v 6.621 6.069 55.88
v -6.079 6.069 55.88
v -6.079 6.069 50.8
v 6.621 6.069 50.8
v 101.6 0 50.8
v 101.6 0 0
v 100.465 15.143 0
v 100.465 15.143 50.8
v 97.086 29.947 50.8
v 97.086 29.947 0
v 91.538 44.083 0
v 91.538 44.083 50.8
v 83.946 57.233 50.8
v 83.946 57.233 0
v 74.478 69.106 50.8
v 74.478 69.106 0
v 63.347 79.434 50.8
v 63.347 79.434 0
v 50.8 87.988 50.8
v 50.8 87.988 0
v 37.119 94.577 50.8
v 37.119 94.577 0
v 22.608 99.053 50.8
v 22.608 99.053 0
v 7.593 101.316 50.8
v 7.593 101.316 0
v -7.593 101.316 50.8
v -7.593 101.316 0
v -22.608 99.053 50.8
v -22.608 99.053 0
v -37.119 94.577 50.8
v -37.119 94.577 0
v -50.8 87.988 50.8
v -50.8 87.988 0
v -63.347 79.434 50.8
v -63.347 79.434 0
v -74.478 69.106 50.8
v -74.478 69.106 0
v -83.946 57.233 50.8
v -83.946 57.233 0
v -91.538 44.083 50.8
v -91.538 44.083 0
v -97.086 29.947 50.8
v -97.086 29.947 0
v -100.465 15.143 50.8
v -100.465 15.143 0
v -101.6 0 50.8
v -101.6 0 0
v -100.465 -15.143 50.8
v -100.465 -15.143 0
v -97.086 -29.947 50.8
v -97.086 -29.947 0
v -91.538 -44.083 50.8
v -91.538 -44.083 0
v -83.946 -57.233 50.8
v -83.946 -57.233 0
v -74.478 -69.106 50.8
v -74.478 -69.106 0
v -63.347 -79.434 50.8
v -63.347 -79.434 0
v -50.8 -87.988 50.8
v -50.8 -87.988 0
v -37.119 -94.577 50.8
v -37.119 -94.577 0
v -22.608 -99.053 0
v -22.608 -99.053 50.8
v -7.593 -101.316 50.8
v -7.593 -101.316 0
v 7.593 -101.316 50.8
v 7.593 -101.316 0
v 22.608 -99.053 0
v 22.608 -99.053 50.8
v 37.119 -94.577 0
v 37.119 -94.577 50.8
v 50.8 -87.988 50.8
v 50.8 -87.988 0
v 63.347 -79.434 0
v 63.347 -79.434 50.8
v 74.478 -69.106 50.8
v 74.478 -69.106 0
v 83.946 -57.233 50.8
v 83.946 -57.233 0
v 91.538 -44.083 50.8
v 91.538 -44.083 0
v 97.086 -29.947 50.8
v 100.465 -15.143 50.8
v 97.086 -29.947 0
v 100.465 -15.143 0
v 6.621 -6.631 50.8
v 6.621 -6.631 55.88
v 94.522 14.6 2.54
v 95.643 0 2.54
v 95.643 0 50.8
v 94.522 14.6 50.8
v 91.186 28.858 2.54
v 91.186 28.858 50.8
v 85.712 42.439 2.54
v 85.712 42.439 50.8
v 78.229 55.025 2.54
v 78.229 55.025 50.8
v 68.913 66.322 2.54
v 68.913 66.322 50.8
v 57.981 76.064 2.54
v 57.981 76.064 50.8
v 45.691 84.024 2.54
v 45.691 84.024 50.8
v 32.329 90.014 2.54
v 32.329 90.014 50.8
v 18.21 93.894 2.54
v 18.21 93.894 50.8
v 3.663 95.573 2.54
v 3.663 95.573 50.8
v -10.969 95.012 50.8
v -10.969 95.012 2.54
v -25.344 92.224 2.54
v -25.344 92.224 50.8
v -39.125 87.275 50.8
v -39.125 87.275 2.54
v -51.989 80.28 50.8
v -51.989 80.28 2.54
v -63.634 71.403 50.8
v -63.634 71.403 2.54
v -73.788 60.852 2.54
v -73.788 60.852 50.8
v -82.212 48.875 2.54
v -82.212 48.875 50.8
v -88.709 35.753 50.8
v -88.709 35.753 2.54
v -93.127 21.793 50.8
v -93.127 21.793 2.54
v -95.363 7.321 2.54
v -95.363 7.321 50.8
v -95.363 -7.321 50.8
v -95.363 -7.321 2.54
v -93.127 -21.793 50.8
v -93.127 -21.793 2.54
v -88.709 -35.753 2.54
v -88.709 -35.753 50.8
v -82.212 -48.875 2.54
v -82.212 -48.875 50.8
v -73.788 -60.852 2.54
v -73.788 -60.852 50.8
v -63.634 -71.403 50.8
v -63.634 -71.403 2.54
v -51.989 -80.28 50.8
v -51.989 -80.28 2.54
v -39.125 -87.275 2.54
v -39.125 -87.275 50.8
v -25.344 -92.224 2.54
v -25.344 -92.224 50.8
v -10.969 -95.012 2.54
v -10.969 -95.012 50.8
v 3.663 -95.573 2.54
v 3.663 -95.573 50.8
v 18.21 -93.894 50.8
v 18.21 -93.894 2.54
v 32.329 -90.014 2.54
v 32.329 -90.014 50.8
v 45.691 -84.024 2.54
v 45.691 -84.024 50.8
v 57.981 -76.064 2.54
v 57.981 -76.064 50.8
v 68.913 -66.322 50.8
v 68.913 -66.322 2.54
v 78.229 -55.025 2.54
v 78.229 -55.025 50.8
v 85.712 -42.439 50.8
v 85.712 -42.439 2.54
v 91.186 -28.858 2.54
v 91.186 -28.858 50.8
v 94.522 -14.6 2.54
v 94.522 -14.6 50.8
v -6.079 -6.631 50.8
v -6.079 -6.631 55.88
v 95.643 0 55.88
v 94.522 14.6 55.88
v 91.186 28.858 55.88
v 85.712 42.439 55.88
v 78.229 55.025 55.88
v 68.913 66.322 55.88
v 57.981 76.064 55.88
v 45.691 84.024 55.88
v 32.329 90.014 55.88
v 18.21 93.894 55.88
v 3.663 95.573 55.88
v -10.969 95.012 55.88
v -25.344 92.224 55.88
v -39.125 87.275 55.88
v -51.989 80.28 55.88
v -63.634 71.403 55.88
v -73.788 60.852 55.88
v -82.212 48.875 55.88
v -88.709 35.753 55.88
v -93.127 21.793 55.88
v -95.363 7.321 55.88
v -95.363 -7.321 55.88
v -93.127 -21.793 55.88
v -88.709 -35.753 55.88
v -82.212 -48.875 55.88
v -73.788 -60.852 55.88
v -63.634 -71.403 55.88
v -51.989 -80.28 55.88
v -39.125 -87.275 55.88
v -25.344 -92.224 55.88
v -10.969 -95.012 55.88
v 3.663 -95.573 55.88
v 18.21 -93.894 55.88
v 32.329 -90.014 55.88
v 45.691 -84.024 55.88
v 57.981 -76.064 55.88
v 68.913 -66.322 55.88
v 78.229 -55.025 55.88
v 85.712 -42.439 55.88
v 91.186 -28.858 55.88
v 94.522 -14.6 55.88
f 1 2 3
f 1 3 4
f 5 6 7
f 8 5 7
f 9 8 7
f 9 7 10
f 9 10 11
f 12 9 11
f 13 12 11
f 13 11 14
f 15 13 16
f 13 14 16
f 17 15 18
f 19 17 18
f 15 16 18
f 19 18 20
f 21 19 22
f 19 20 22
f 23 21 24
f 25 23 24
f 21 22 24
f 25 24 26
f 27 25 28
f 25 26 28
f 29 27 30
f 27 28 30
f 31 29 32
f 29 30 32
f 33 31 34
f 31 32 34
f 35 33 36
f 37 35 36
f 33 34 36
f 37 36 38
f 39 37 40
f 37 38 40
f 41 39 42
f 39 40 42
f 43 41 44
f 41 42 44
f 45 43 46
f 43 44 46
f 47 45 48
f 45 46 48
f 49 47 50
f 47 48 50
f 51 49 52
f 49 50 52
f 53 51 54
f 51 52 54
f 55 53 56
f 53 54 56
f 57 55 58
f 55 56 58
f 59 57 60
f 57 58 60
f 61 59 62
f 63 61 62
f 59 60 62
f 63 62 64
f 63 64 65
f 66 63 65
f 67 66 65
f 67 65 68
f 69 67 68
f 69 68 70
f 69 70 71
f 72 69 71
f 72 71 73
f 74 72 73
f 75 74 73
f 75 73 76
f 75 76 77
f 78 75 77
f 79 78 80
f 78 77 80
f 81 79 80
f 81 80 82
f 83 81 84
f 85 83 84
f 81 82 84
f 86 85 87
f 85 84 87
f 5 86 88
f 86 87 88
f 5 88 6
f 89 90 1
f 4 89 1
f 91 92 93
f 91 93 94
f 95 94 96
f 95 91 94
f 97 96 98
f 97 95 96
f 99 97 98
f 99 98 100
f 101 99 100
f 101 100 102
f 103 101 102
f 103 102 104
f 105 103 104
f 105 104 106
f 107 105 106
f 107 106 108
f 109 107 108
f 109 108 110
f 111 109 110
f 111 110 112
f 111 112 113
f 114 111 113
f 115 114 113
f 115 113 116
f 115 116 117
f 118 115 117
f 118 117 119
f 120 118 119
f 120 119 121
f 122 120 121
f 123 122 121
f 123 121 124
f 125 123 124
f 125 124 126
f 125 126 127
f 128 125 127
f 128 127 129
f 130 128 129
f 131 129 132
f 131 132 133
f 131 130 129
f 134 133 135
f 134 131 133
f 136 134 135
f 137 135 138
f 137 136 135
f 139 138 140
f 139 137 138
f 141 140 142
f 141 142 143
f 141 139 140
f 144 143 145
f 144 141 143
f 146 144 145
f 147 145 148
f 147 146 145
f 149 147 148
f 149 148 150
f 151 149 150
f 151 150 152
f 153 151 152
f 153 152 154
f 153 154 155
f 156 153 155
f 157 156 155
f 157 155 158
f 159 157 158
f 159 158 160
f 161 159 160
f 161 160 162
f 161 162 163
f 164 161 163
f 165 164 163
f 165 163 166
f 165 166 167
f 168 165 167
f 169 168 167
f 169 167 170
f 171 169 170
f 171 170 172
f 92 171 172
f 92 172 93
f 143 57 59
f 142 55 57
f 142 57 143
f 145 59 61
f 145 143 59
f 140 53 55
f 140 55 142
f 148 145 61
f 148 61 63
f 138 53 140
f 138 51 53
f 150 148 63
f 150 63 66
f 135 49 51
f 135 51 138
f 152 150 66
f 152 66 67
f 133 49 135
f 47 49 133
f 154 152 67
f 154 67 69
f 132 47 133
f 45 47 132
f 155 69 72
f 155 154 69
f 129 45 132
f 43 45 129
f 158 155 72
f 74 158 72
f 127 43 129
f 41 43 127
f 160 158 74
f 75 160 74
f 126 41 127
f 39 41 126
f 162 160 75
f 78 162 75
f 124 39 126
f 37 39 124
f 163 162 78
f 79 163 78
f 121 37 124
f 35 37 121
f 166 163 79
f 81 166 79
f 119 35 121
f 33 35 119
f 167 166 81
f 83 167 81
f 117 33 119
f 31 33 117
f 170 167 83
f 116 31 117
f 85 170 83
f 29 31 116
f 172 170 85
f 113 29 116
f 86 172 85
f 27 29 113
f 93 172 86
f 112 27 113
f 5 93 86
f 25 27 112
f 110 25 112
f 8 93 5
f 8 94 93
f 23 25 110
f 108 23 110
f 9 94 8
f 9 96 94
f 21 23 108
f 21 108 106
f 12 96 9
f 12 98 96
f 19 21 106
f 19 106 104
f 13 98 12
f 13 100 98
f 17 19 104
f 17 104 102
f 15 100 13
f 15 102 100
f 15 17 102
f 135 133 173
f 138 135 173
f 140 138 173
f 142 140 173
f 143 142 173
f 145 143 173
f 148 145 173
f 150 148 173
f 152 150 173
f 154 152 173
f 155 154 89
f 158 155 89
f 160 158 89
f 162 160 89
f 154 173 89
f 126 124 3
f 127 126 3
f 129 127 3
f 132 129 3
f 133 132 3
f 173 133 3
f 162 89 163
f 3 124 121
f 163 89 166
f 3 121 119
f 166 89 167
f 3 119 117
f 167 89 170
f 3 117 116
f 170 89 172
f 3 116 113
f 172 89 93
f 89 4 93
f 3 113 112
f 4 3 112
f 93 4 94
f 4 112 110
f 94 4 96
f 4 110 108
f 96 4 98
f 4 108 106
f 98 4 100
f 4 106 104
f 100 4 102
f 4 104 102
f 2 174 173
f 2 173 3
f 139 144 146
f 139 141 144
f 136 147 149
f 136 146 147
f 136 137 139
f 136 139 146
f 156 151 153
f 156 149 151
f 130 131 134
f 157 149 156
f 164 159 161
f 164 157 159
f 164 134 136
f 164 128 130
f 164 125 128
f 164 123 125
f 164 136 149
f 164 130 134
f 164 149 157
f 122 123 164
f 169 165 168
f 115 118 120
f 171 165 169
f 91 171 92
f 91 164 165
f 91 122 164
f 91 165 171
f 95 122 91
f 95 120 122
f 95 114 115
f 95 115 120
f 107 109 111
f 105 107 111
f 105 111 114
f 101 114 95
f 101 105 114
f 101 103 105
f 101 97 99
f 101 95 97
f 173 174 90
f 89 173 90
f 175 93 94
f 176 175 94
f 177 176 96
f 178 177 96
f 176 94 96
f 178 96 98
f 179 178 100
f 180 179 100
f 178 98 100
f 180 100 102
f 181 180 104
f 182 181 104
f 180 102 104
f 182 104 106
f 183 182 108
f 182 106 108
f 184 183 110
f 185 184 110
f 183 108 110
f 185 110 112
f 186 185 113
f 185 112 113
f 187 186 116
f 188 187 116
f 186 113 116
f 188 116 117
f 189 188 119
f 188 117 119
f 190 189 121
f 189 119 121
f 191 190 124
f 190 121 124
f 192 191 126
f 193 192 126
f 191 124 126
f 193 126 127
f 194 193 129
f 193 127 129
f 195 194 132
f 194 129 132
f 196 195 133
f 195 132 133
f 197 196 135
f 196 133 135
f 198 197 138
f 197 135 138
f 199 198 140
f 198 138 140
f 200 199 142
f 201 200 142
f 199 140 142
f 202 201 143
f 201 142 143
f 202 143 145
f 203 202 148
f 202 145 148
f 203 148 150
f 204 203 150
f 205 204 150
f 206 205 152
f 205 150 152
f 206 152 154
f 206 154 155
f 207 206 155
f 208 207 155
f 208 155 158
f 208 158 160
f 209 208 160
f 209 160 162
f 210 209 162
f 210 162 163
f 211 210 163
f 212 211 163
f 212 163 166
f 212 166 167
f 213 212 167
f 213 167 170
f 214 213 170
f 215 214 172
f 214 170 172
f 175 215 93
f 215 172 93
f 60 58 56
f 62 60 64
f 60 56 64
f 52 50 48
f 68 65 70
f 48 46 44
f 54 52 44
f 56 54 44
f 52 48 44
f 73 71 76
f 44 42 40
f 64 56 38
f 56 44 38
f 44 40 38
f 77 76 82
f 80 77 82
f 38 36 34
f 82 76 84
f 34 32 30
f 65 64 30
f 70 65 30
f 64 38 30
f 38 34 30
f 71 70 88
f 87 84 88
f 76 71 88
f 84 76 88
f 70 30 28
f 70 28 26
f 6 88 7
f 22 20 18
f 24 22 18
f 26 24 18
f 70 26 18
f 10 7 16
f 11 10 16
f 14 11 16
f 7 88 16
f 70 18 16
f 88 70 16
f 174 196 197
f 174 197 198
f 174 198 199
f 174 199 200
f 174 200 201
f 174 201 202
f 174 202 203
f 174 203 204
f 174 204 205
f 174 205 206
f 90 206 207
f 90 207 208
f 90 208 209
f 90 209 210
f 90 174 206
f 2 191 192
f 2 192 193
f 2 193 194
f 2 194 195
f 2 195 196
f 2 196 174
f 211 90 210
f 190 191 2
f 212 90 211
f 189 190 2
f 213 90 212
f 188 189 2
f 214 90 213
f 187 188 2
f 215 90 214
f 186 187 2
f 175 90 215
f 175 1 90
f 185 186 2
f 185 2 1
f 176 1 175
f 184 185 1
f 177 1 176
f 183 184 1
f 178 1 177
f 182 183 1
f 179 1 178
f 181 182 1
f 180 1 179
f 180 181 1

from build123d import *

# Parameters (mm, degrees)
F1_R     = 101.6
F1_R_2   = 95.643189
F2_DEPTH = 50.8
F3_R     = 95.67193
F4_DEPTH = 2.54
F5_R     = 95.643189
F6_DEPTH = 5.08
F7_W     = 12.7
F7_H     = 12.7
F8_DEPTH = 50.8


with BuildPart() as f2:
    # F1 (on face) → F2 (new body)
    with BuildSketch(Plane.XY):
        Circle(F1_R)
        Circle(F1_R_2, mode=Mode.SUBTRACT)
    extrude(amount=F2_DEPTH)

    # F3 (on face) → F4 (join)
    with BuildSketch(Plane.XY):
        Circle(F3_R)
    extrude(amount=F4_DEPTH)


with BuildPart() as f6:
    # F5 (on face) → F6 (new body)
    with BuildSketch(Plane.XY.offset(50.8)):
        Circle(F5_R)
    extrude(amount=F6_DEPTH)

    # F7 (on face) → F8 (cut)
    with BuildSketch(Plane.XY.offset(55.88)):
        with Locations((0.270761, -0.281108)):
            Rectangle(F7_W, F7_H)
    extrude(amount=-F8_DEPTH, mode=Mode.SUBTRACT)


solid = Compound([f2.part, f6.part])
